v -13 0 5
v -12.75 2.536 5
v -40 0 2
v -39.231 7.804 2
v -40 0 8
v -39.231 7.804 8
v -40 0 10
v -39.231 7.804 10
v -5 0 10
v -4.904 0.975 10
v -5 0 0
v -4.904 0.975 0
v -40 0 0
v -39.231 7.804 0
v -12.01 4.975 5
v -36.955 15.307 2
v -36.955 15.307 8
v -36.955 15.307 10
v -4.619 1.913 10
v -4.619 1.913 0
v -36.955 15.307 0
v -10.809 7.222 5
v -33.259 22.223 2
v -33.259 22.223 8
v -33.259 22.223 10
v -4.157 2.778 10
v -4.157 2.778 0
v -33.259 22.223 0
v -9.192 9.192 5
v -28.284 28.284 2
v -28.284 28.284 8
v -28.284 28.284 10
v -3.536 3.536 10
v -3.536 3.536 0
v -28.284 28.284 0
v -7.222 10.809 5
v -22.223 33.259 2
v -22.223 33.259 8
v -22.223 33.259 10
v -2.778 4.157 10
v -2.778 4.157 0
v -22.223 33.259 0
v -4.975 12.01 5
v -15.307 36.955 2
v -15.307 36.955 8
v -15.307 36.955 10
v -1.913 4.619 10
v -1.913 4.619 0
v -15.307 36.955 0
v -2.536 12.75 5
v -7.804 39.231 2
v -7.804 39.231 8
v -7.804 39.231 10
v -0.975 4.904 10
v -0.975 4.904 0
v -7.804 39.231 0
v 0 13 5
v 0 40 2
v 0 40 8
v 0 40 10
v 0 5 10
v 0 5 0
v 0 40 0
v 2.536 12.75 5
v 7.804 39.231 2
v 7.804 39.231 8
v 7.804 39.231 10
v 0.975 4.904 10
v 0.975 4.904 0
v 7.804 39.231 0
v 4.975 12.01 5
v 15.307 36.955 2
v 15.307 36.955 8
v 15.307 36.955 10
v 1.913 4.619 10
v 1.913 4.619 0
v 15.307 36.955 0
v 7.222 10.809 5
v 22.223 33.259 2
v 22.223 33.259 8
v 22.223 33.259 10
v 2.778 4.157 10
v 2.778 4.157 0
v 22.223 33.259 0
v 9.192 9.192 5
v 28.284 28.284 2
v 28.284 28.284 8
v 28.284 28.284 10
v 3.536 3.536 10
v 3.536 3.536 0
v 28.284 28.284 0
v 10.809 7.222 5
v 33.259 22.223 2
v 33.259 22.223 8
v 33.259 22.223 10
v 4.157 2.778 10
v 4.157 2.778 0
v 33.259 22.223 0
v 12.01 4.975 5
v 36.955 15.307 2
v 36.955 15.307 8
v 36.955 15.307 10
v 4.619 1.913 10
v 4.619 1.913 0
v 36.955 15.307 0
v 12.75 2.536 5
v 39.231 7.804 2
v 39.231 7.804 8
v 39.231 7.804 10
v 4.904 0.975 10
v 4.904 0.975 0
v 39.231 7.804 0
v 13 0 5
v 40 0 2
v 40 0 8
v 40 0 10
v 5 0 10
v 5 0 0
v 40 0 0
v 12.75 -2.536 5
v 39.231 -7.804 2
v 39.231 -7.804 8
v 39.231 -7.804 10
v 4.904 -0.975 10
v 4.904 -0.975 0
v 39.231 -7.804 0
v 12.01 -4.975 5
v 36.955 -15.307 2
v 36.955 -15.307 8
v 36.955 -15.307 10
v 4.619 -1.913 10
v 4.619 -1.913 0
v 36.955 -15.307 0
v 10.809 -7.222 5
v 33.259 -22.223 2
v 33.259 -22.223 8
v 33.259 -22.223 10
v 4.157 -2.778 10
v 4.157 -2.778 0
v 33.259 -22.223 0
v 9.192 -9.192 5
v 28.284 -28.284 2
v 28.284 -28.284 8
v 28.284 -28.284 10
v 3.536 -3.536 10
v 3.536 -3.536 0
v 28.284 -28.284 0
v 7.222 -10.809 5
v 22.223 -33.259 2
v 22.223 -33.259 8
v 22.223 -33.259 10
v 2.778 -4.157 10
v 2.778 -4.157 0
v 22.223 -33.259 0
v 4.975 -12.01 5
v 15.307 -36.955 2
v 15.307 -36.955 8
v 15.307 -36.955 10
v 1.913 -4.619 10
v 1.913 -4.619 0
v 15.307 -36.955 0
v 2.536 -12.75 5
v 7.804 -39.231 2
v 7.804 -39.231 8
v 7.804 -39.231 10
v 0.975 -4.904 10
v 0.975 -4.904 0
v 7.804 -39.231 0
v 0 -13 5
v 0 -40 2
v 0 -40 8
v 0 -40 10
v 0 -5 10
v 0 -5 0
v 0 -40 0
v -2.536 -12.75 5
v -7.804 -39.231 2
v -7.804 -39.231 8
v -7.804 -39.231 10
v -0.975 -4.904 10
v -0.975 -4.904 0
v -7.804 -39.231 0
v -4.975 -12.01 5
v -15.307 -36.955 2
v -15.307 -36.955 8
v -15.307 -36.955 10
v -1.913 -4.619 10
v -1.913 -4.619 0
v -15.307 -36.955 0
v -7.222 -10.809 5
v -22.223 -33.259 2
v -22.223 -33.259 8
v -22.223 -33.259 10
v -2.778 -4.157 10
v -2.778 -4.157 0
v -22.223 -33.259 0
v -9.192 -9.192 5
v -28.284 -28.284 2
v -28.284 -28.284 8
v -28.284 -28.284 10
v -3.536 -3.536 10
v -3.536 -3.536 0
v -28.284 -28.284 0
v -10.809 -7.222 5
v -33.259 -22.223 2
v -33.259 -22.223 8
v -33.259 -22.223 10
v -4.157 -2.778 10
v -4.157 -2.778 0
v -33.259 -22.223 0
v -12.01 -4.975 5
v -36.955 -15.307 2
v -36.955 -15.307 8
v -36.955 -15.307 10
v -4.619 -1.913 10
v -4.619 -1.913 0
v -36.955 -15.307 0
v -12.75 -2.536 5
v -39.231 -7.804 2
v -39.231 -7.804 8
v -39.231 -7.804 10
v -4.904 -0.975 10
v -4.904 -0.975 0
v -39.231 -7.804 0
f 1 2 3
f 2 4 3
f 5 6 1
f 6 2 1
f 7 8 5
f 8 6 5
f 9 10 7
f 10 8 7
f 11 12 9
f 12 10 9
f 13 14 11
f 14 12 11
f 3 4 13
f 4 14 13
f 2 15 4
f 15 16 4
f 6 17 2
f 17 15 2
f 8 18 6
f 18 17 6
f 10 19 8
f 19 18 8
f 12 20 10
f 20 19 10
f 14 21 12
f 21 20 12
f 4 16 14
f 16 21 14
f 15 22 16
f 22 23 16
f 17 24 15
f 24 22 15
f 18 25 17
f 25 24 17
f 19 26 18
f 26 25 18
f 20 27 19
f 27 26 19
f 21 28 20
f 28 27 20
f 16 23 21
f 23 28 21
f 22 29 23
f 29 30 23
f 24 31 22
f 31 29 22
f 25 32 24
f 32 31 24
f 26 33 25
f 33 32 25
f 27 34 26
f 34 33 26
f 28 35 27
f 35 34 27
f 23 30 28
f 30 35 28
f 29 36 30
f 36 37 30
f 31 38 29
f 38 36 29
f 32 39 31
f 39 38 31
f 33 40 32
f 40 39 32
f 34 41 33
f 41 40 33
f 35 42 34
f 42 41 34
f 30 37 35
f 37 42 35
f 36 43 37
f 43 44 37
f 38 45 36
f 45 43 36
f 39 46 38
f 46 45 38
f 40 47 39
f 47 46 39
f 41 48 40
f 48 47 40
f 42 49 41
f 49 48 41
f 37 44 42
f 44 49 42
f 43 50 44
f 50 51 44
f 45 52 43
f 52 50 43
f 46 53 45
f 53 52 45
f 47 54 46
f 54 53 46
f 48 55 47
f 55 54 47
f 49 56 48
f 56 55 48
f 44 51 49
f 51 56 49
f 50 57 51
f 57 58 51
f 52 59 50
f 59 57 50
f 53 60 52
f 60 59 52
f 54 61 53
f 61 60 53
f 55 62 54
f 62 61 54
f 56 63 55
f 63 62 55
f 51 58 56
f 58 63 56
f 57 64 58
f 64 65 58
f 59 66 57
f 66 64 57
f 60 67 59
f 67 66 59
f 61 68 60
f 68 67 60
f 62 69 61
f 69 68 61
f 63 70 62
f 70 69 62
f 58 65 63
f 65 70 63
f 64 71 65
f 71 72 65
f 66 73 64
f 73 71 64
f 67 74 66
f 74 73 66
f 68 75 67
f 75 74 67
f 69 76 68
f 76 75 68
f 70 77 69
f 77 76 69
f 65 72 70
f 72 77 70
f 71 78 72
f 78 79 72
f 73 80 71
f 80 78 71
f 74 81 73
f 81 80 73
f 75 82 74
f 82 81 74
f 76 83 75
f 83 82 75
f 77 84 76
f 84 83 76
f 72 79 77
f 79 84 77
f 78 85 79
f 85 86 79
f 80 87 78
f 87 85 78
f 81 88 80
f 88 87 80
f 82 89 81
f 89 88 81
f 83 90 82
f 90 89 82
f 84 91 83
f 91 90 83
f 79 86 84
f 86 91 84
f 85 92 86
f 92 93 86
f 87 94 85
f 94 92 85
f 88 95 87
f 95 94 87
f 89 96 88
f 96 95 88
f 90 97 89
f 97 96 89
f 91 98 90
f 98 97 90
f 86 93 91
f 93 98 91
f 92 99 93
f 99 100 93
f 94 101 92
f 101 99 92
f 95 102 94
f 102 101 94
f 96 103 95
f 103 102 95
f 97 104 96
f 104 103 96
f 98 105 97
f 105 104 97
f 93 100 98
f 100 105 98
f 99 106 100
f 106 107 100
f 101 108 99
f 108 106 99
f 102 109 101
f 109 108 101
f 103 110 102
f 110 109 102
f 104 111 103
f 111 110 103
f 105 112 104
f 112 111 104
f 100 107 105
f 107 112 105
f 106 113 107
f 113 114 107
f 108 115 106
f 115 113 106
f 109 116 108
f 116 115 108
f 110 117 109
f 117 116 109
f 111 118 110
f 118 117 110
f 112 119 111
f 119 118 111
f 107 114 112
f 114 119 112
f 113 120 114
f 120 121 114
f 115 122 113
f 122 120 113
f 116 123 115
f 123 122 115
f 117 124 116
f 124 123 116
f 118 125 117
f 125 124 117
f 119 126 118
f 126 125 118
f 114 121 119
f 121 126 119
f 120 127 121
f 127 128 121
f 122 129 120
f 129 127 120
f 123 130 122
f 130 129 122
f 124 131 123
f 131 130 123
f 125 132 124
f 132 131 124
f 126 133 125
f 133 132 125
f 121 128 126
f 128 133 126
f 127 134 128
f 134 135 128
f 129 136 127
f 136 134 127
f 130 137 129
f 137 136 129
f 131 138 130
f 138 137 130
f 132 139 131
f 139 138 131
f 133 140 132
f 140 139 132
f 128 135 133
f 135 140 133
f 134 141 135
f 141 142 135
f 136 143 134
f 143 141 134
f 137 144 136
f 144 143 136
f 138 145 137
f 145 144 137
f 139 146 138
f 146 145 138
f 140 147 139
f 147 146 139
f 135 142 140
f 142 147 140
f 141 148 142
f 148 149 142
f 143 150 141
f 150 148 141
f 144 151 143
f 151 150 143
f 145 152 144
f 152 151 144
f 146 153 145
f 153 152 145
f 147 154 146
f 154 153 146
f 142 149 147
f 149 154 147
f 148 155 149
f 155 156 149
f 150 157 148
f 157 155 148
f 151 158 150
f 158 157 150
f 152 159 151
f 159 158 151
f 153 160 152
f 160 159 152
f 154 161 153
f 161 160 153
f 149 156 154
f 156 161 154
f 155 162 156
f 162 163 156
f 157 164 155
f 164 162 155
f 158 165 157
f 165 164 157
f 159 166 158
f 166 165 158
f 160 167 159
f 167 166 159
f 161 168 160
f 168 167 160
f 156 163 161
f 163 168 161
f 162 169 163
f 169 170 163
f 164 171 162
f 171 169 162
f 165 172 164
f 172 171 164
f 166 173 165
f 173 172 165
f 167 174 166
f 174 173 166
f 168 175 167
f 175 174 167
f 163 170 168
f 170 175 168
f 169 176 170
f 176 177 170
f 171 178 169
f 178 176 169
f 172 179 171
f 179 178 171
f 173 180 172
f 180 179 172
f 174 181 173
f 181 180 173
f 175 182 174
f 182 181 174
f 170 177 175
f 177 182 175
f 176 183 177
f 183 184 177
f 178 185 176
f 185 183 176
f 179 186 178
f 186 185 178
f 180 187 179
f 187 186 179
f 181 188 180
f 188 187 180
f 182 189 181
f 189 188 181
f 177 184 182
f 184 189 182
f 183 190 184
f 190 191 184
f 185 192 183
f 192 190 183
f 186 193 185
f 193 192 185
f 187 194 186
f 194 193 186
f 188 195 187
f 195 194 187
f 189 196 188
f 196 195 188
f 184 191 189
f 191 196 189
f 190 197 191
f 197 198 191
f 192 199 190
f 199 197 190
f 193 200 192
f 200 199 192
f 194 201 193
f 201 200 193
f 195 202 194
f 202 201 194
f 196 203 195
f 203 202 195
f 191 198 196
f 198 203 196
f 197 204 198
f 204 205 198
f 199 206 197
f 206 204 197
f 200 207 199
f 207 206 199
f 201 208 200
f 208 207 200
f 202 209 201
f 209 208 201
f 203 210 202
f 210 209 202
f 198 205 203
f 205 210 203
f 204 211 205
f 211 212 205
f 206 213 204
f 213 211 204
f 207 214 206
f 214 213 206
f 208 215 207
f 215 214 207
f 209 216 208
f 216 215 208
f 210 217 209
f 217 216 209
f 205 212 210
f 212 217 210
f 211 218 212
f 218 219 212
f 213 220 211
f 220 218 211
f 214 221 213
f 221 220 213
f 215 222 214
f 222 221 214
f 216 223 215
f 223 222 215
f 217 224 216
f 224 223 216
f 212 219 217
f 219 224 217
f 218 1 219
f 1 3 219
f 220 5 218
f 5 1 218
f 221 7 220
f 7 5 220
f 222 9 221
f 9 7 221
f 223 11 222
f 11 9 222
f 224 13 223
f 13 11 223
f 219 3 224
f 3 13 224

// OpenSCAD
$fn = 32;

// ----------------------------------------------------------------------
// Revolved part: V-groove pulley R40
// ----------------------------------------------------------------------

// --- parameters (mm) ---
bore_r = 5;               // bore radius
rim_r = 40;               // rim radius
rim_t = 10;               // rim width
groove_r = 13;            // groove root radius
groove_w = 3;             // groove half width
revolve_angle = 360;      // revolve sweep, degrees

bore_d = 2 * bore_r;
rim_d = 2 * rim_r;
groove_d = 2 * groove_r;

profile = [[5, 0], [40, 0], [40, 2], [13, 5], [40, 8], [40, 10], [5, 10]];  // primary outline, 7 points, counter clockwise

// --- the one profile operation ---
rotate_extrude(angle = revolve_angle) polygon(points = profile);
